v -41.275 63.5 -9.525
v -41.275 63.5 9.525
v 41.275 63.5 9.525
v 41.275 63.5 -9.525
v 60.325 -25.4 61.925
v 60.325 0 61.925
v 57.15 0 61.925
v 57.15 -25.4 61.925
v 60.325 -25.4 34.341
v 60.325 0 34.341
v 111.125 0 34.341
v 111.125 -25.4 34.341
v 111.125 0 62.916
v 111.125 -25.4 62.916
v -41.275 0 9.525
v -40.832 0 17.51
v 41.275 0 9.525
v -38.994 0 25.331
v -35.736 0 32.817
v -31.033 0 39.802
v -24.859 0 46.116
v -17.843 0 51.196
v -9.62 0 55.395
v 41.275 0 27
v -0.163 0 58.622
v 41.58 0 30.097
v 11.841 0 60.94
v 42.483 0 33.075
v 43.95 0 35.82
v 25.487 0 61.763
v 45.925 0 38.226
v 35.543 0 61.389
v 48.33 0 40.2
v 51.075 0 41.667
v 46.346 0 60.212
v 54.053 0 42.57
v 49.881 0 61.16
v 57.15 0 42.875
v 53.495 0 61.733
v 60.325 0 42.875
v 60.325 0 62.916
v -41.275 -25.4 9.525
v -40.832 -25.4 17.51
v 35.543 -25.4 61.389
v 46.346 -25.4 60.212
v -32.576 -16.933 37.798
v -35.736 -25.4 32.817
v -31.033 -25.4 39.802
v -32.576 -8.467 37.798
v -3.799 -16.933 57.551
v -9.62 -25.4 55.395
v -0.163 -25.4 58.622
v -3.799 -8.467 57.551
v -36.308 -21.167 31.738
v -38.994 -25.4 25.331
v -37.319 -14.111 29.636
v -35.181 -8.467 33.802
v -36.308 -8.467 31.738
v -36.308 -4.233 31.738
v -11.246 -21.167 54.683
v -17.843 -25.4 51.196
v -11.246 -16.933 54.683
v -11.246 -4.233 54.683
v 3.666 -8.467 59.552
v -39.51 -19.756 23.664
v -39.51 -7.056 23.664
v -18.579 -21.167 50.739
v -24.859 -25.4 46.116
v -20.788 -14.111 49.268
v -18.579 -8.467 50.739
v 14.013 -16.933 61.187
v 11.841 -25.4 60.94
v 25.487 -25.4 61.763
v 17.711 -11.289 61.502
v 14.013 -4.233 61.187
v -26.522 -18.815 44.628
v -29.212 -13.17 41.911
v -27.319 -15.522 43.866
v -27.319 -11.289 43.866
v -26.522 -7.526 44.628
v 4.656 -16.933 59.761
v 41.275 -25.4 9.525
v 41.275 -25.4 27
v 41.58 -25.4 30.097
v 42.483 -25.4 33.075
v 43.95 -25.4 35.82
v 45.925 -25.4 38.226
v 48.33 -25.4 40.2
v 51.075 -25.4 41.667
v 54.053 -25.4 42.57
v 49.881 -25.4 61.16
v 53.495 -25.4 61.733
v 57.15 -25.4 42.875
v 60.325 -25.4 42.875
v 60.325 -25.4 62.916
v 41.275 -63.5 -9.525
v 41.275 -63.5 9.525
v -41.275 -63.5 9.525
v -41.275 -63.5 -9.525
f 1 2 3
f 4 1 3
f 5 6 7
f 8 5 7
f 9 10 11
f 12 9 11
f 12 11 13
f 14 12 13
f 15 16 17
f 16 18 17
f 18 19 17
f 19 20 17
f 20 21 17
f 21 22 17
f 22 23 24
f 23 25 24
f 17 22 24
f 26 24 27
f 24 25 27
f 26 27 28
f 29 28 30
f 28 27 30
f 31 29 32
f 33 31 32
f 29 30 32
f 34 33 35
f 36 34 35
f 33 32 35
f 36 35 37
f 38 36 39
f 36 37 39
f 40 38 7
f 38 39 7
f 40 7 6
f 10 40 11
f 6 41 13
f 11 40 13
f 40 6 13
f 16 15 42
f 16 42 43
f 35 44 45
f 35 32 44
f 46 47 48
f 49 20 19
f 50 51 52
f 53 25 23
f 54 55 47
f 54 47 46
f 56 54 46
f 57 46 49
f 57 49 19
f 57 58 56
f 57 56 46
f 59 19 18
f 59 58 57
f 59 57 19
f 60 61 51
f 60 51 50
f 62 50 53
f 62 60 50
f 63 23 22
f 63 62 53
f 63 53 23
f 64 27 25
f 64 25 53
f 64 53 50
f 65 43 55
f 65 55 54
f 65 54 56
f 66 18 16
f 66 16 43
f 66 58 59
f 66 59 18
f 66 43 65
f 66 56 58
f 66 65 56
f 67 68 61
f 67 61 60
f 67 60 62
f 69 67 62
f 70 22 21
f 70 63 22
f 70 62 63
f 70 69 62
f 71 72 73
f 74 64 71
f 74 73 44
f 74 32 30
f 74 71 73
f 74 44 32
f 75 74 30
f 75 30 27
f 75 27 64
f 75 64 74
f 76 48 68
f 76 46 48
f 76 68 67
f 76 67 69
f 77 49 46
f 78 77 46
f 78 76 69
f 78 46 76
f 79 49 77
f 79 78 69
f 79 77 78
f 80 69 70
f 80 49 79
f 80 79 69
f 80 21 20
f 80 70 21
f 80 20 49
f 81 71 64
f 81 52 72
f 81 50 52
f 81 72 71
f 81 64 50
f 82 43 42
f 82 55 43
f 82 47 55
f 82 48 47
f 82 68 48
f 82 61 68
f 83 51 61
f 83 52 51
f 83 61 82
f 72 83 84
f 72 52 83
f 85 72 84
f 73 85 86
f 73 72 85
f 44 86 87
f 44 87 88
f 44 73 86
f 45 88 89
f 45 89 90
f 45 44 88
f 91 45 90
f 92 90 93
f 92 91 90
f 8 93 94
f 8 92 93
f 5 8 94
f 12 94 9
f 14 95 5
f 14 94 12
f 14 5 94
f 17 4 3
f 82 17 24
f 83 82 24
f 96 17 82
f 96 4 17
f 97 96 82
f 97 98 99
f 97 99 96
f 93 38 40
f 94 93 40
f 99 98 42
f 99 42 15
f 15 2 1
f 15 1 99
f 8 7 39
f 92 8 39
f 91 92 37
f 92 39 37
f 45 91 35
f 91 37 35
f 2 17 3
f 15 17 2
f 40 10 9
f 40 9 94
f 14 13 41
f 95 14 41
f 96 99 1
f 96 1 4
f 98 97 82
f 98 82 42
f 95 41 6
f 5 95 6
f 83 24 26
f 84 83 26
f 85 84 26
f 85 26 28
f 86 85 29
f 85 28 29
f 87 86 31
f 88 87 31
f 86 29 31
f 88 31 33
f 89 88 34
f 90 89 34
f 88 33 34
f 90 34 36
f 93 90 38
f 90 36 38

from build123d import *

# Parameters (mm, degrees)
F1_DEPTH = 63.5
F0_W     = 32.3452991128
F0_H     = 19.05
F0_H_2   = 8.5344
F2_DEPTH = 25.4


with BuildPart() as f1:
    # F0 (on Front) → F1 (new body, symmetric)
    with BuildSketch(Plane.XZ):
        Polygon((-41.275, 9.525), (-41.275, -9.525), (41.275, -9.525), (41.275, 9.525), (22.225, 9.525), align=None)
    extrude(amount=F1_DEPTH, both=True)

    # F0 (on Front) → F2 (join)
    with BuildSketch(Plane.XZ):
        Polygon((-41.275, 9.525), (-41.275, -9.525), (41.275, -9.525), (41.275, 9.525), (22.225, 9.525), align=None)
        with BuildLine():
            add(Edge.make_bspline(
                [(-41.275, 9.525), (-42.1845465899, 39.2021462321), (-14.9138346314, 68.9535290003), (46.3458457894, 60.212033385)],
                knots=[0, 0, 0, 0, 101.22543144, 101.22543144, 101.22543144, 101.22543144], degree=3))
            Line((-41.275, 9.525), (22.225, 9.525))
            Line((22.225, 9.525), (22.225, 27.0002))
            ThreePointArc((22.225, 27.0002), (28.891455179, 47.5236078456), (46.3458457894, 60.212033385))
        make_face()
        with BuildLine():
            Line((22.225, 9.525), (41.275, 9.525))
            Line((41.275, 9.525), (41.275, 27.0002))
            ThreePointArc((41.275, 27.0002), (45.9246798487, 38.2255201513), (57.15, 42.8752))
            Line((57.15, 42.8752), (60.325, 42.8752))
            Line((60.325, 42.8752), (60.325, 61.9252))
            Line((60.325, 61.9252), (57.15, 61.9252))
            ThreePointArc((57.15, 61.9252), (51.6804321913, 61.4942495301), (46.3458457894, 60.212033385))
            ThreePointArc((46.3458457894, 60.212033385), (28.891455179, 47.5236078456), (22.225, 27.0002))
            Line((22.225, 27.0002), (22.225, 9.525))
        make_face()
        with Locations((76.4976495564, 52.4002)):
            Rectangle(F0_W, F0_H)
        Polygon((60.325, 62.9158), (60.325, 61.9252), (92.6702991128, 61.9252), (92.6702991128, 42.8752), (92.6702991128, 34.3408), (111.125, 34.3408), (111.125, 62.9158), align=None)
        with Locations((76.4976495564, 38.608)):
            Rectangle(F0_W, F0_H_2)
    extrude(amount=F2_DEPTH)


solid = f1.part
